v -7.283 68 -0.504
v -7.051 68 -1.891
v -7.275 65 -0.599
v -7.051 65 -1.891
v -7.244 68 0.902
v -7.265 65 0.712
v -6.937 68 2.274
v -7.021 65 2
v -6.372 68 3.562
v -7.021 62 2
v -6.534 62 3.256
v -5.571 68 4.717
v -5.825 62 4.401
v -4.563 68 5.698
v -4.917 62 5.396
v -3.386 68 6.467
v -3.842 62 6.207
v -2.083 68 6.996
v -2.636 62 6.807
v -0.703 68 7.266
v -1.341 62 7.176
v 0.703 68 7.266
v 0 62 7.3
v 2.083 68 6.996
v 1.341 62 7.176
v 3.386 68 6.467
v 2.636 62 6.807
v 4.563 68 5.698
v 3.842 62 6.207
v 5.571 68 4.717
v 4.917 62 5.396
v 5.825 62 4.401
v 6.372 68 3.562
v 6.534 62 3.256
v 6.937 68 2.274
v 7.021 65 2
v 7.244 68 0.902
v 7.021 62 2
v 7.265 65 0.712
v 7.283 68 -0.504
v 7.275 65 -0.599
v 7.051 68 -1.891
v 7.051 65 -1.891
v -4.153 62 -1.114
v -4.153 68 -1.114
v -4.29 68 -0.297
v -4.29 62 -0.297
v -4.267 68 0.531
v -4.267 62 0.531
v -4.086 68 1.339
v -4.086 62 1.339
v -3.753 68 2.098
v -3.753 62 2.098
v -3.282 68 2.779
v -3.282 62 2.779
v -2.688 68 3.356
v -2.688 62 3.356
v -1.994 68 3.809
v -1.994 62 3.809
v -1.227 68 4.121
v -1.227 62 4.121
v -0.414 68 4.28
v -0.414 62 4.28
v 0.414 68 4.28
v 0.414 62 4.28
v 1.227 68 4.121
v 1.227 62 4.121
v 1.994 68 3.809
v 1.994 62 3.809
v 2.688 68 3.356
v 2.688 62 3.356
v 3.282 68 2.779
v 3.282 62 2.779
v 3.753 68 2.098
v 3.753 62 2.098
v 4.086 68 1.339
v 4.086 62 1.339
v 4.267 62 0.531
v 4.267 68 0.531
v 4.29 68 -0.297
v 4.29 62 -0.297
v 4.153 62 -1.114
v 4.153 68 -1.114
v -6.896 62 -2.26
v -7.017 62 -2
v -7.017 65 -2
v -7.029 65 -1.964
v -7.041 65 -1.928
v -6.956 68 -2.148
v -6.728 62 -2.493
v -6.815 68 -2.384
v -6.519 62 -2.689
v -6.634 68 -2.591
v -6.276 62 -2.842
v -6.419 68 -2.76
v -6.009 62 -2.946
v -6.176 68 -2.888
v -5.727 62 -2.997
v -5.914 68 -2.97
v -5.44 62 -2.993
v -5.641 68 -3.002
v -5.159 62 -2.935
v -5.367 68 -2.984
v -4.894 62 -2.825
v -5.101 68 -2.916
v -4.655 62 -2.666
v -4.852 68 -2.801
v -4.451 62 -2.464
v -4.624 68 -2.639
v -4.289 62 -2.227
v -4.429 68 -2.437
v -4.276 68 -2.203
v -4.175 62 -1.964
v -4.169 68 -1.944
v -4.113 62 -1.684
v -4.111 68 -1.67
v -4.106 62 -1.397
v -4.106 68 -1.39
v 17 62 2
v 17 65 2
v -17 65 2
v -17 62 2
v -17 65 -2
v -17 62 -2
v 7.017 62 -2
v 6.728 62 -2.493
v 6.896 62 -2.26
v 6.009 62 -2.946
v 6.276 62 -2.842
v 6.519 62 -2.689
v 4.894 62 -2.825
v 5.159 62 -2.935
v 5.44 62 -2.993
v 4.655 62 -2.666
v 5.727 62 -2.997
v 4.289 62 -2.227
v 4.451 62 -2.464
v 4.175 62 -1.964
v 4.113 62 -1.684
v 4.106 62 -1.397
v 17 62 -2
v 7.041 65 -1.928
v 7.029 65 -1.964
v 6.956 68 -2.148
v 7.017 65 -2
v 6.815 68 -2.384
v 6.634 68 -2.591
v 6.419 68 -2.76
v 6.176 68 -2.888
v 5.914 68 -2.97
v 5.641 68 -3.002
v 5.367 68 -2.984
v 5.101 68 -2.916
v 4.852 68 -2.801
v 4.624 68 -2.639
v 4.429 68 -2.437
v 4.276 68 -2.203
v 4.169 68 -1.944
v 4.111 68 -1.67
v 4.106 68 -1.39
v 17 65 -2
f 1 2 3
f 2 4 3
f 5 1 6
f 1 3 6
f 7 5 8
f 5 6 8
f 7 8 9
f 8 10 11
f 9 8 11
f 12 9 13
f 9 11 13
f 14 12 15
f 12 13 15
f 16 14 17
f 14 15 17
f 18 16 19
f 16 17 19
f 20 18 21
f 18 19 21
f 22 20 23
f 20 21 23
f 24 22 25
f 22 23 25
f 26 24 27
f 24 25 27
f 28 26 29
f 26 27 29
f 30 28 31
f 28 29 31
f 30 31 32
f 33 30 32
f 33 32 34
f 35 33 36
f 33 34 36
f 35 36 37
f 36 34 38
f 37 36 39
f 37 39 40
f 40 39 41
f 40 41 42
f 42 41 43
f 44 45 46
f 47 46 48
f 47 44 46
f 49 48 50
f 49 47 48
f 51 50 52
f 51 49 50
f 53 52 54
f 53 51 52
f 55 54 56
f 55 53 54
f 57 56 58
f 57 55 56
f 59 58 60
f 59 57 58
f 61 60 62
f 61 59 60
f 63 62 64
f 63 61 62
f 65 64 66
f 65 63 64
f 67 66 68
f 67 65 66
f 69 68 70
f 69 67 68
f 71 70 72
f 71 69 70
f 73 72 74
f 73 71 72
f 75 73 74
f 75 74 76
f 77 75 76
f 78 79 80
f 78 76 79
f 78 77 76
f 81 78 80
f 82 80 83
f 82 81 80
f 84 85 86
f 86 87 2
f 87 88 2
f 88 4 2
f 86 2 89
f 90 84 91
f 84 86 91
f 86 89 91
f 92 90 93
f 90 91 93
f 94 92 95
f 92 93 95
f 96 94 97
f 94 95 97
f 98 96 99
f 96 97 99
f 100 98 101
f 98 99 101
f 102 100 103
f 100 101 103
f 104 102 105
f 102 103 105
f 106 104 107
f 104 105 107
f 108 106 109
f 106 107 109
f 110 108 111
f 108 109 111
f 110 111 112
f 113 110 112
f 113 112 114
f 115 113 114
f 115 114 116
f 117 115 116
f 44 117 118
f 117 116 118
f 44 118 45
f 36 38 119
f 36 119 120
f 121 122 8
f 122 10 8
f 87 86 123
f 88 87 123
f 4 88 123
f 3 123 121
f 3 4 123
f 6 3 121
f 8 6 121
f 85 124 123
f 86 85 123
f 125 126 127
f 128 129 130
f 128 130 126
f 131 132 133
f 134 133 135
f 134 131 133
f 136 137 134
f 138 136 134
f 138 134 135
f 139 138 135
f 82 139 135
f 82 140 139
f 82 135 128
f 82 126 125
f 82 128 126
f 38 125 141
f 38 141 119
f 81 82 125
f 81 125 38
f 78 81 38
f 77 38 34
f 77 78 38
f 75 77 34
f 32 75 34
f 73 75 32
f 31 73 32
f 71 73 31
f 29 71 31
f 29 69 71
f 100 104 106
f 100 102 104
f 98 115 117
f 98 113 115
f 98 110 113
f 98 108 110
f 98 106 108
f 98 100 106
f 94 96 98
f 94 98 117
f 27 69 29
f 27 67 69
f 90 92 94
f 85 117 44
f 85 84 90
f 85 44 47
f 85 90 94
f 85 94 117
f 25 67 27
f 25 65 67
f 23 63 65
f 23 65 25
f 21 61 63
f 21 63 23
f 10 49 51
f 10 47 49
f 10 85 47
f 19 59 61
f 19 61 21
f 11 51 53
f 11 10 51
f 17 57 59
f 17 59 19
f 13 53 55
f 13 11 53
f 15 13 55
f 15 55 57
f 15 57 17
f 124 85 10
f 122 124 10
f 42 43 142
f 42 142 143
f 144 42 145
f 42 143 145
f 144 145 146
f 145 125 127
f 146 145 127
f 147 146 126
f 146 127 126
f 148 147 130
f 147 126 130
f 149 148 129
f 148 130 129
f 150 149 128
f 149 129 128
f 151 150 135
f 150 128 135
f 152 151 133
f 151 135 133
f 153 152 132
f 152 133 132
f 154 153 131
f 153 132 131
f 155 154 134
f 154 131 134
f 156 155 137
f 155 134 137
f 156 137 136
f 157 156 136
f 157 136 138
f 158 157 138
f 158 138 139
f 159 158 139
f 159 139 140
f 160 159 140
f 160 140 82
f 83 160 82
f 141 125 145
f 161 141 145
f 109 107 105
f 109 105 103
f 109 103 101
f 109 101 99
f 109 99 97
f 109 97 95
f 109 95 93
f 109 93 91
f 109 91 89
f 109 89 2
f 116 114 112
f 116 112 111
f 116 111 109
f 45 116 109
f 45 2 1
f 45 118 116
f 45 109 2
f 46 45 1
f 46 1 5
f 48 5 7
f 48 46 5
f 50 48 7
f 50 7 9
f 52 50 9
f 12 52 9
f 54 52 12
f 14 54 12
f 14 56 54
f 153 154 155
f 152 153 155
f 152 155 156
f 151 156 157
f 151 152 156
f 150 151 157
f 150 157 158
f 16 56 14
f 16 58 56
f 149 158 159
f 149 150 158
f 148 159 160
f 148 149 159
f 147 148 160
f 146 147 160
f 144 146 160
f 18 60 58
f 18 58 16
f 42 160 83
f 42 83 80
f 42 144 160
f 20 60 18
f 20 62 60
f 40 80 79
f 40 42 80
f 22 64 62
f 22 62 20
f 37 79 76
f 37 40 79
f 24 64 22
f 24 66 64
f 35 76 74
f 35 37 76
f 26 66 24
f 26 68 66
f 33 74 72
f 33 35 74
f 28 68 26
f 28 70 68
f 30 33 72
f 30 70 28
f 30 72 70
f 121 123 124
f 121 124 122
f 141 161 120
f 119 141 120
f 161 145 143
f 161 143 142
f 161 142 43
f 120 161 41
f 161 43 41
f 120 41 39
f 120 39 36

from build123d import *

# Parameters (mm, degrees)
SKETCH1_W                = 30
SKETCH1_H                = 30
BOSS_EXTRUDE1_DEPTH      = 5
SKETCH2_W                = 10
SKETCH2_H                = 10
BOSS_EXTRUDE2_DEPTH      = 50
SKETCH3_W                = 10
SKETCH3_H                = 3
SKETCH3_W_2              = 5
SKETCH3_H_2              = 7
SKETCH3_H_3              = 5
BOSS_EXTRUDE3_DEPTH      = 2
BOSS_EXTRUDE4_DEPTH      = 3
BOSS_EXTRUDE4_DEPTH_BACK = 5
SKETCH4_R                = 7.3
SKETCH4_R_2              = 4.3
CUT_EXTRUDE1_DEPTH       = 6
CUT_EXTRUDE1_DEPTH_BACK  = 5
SKETCH6_R                = 4.3
FILLET1_R                = 1.5
FILLET2_R                = 1.5
FILLET3_R                = 2
SKETCH7_W                = 39.438883959
SKETCH7_H                = 36.533940166
CUT_EXTRUDE2_DEPTH       = 80
SKETCH8_W                = 4
SKETCH8_H                = 3
BOSS_EXTRUDE5_DEPTH      = 2


with BuildPart() as part:
    # Sketch1 → Boss-Extrude1 (new body)
    with BuildSketch(Plane(origin=(0, 0, 0), x_dir=(1, 0, 0), z_dir=(0, 1, 0))):
        Rectangle(SKETCH1_W, SKETCH1_H)
    extrude(amount=BOSS_EXTRUDE1_DEPTH)

    # Sketch2 → Boss-Extrude2 (add)
    with BuildSketch(Plane(origin=(0, 5, 0), x_dir=(1, 0, 0), z_dir=(0, 1, 0))):
        Rectangle(SKETCH2_W, SKETCH2_H)
    extrude(amount=BOSS_EXTRUDE2_DEPTH)

    # Sketch3 → Boss-Extrude3 (add, symmetric)
    with BuildSketch(Plane.XY):
        with Locations((-5, 63.5)):
            Rectangle(SKETCH3_W, SKETCH3_H)
        with Locations((-12.5, 63.5)):
            Rectangle(SKETCH3_W_2, SKETCH3_H)
        with Locations((-12.5, 58.5)):
            Rectangle(SKETCH3_W_2, SKETCH3_H_2)
        with Locations((-12.5, 52.5)):
            Rectangle(SKETCH3_W_2, SKETCH3_H_3)
        with Locations((-7.5, 52.5)):
            Rectangle(SKETCH3_W_2, SKETCH3_H_3)
    boss_extrude3 = extrude(amount=BOSS_EXTRUDE3_DEPTH, both=True)

    # Mirror1: Boss-Extrude3 across plane
    add(boss_extrude3.mirror(Plane(origin=(0, 0, 0), x_dir=(0, 0, 1), z_dir=(1, 0, 0))))

    # Sketch4 → Boss-Extrude4 (add, two sides: drawn at the far end of the back side and taken through both)
    with BuildSketch(Plane(origin=(0, 65, 0), x_dir=(1, 0, 0), z_dir=(0, 1, 0)).offset(-BOSS_EXTRUDE4_DEPTH_BACK)):
        with Locations(Location((0, 0, 0), (0, 0, 270))):
            Circle(SKETCH4_R)
        with Locations(Location((0, 0, 0), (0, 0, 270))):
            Circle(SKETCH4_R_2, mode=Mode.SUBTRACT)
    extrude(amount=BOSS_EXTRUDE4_DEPTH + BOSS_EXTRUDE4_DEPTH_BACK)

    # Sketch6 → Cut-Extrude1 (cut, two sides: drawn at the far end of the back side and taken through both)
    with BuildSketch(Plane(origin=(0, 65, 0), x_dir=(1, 0, 0), z_dir=(0, 1, 0)).offset(-CUT_EXTRUDE1_DEPTH_BACK)):
        Circle(SKETCH6_R)
        with BuildLine():
            Line((-6.321985448, 3.65), (0, 0))
            Line((0, 0), (6.321985448, 3.65))
            ThreePointArc((6.321985448, 3.65), (0, 7.3), (-6.321985448, 3.65))
        make_face()
    extrude(amount=CUT_EXTRUDE1_DEPTH + CUT_EXTRUDE1_DEPTH_BACK, mode=Mode.SUBTRACT)

    # Fillet1
    # the kernel refuses this fillet: 1.5 mm, written as the material it takes off along each edge
    with BuildSketch(Plane(origin=(6.321985448, 55.239509531, -3.65), x_dir=(0.3827782883031586, 1.5487943038784236e-14, 0.923840236190059), z_dir=(0, 1, 0))) as fillet1_piece_1_section:
        with BuildLine():
            CenterArc((1.708559593, -1.487187387), FILLET1_R, 82.505882759, 104.988234482)
            Line((0.221372206, -1.682823981), (0, 0))
            ThreePointArc((0, 0), (0.952098094, 0.062354719), (1.904196188, 0))
        make_face()
    fillet1_piece_1 = extrude(amount=17.520980938, mode=Mode.PRIVATE)
    fillet1_piece_1 = split(fillet1_piece_1, bisect_by=Plane(origin=(7.049867501, 58.619754766, -2), z_dir=(0, 0, 1)), keep=Keep.TOP, mode=Mode.PRIVATE)
    fillet1_piece_1 = split(fillet1_piece_1, bisect_by=Plane(origin=(7.049867501, 62, -1.948339527), z_dir=(0, -1, 0)), keep=Keep.TOP, mode=Mode.PRIVATE)
    add(fillet1_piece_1, mode=Mode.SUBTRACT)
    with BuildSketch(Plane(origin=(6.321985448, 55.239509531, -3.65), x_dir=(0.3827782883031586, 1.5487943038784236e-14, 0.923840236190059), z_dir=(0, 1, 0))) as fillet1_piece_2_section:
        with BuildLine():
            CenterArc((1.708559593, -1.487187387), FILLET1_R, 82.505882759, 104.988234482)
            Line((0.221372206, -1.682823981), (0, 0))
            ThreePointArc((0, 0), (0.952098094, 0.062354719), (1.904196188, 0))
        make_face()
    fillet1_piece_2 = extrude(amount=17.520980938, mode=Mode.PRIVATE)
    fillet1_piece_2 = split(fillet1_piece_2, bisect_by=Plane(origin=(6.1871982, 58.619754766, -2), z_dir=(0, 0, -1)), keep=Keep.TOP, mode=Mode.PRIVATE)
    fillet1_piece_2 = split(fillet1_piece_2, bisect_by=Plane(origin=(6.1871982, 62, -3.070632647), z_dir=(0, -1, 0)), keep=Keep.TOP, mode=Mode.PRIVATE)
    add(fillet1_piece_2, mode=Mode.SUBTRACT)
    with BuildSketch(Plane(origin=(6.321985448, 55.239509531, -3.65), x_dir=(0.3827782883031586, 1.5487943038784236e-14, 0.923840236190059), z_dir=(0, 1, 0))) as fillet1_piece_3_section:
        with BuildLine():
            CenterArc((1.708559593, -1.487187387), FILLET1_R, 82.505882759, 104.988234482)
            Line((0.221372206, -1.682823981), (0, 0))
            ThreePointArc((0, 0), (0.952098094, 0.062354719), (1.904196188, 0))
        make_face()
    fillet1_piece_3 = extrude(amount=17.520980938, mode=Mode.PRIVATE)
    fillet1_piece_3 = split(fillet1_piece_3, bisect_by=Plane(origin=(6.1871982, 63.5, -2), z_dir=(0, 0, -1)), keep=Keep.TOP, mode=Mode.PRIVATE)
    fillet1_piece_3 = split(fillet1_piece_3, bisect_by=Plane(origin=(6.1871982, 65, -3.070632647), z_dir=(0, -1, 0)), keep=Keep.TOP, mode=Mode.PRIVATE)
    fillet1_piece_3 = split(fillet1_piece_3, bisect_by=Plane(origin=(6.1871982, 62, -3.070632647), z_dir=(0, 1, 0)), keep=Keep.TOP, mode=Mode.PRIVATE)
    add(fillet1_piece_3, mode=Mode.SUBTRACT)
    with BuildSketch(Plane(origin=(6.321985448, 55.239509531, -3.65), x_dir=(0.3827782883031586, 1.5487943038784236e-14, 0.923840236190059), z_dir=(0, 1, 0))) as fillet1_piece_4_section:
        with BuildLine():
            CenterArc((1.708559593, -1.487187387), FILLET1_R, 82.505882759, 104.988234482)
            Line((0.221372206, -1.682823981), (0, 0))
            ThreePointArc((0, 0), (0.952098094, 0.062354719), (1.904196188, 0))
        make_face()
    fillet1_piece_4 = extrude(amount=17.520980938, mode=Mode.PRIVATE)
    fillet1_piece_4 = split(fillet1_piece_4, bisect_by=Plane(origin=(7.049867501, 68.880245234, -2), z_dir=(0, 0, 1)), keep=Keep.TOP, mode=Mode.PRIVATE)
    fillet1_piece_4 = split(fillet1_piece_4, bisect_by=Plane(origin=(7.049867501, 65, -1.948339527), z_dir=(0, 1, 0)), keep=Keep.TOP, mode=Mode.PRIVATE)
    add(fillet1_piece_4, mode=Mode.SUBTRACT)
    with BuildSketch(Plane(origin=(6.321985448, 55.239509531, -3.65), x_dir=(0.3827782883031586, 1.5487943038784236e-14, 0.923840236190059), z_dir=(0, 1, 0))) as fillet1_piece_5_section:
        with BuildLine():
            CenterArc((1.708559593, -1.487187387), FILLET1_R, 82.505882759, 104.988234482)
            Line((0.221372206, -1.682823981), (0, 0))
            ThreePointArc((0, 0), (0.952098094, 0.062354719), (1.904196188, 0))
        make_face()
    fillet1_piece_5 = extrude(amount=17.520980938, mode=Mode.PRIVATE)
    fillet1_piece_5 = split(fillet1_piece_5, bisect_by=Plane(origin=(6.1871982, 68.880245234, -2), z_dir=(0, 0, -1)), keep=Keep.TOP, mode=Mode.PRIVATE)
    fillet1_piece_5 = split(fillet1_piece_5, bisect_by=Plane(origin=(6.1871982, 65, -3.070632647), z_dir=(0, 1, 0)), keep=Keep.TOP, mode=Mode.PRIVATE)
    add(fillet1_piece_5, mode=Mode.SUBTRACT)
    with BuildSketch(Plane(origin=(3.723909236, 56.743305172, -2.15), x_dir=(0.38277828830315935, 0, 0.9238402361900588), z_dir=(0, 1, 0))) as fillet1_piece_6:
        with BuildLine():
            CenterArc((1.317286404, 1.487187387), FILLET1_R, 187.494117241, 75.011765518)
            Line((-0.169900983, 1.291550792), (0, 0))
            ThreePointArc((0, 0), (0.560824905, 0.036729492), (1.121649809, 0))
        make_face()
    extrude(amount=14.513389656, mode=Mode.SUBTRACT)

    # Fillet2
    # the kernel refuses this fillet: 1.5 mm, written as the material it takes off along each edge
    with BuildSketch(Plane(origin=(-3.723909236, 71.256694828, -2.15), x_dir=(-0.38277828830315846, 0, 0.923840236190059), z_dir=(0, -1, 0))) as fillet2_piece_1:
        with BuildLine():
            CenterArc((1.317286404, 1.487187387), FILLET2_R, 187.494117241, 75.011765518)
            Line((-0.169900983, 1.291550792), (0, 0))
            ThreePointArc((0, 0), (0.560824905, 0.036729492), (1.121649809, 0))
        make_face()
    extrude(amount=14.513389656, mode=Mode.SUBTRACT)
    with BuildSketch(Plane(origin=(-6.321985448, 72.760490469, -3.65), x_dir=(0.8660254037844403, 0, 0.4999999999999975), z_dir=(0, -1, 0))) as fillet2_piece_2_section:
        with BuildLine():
            CenterArc((1.697322069, 1.5), FILLET2_R, 165.011765518, 104.988234482)
            ThreePointArc((0.248353638, 1.887931034), (0.062354719, 0.952098094), (0, 0))
            Line((0, 0), (1.697322069, 0))
        make_face()
    fillet2_piece_2 = extrude(amount=17.520980938, mode=Mode.PRIVATE)
    fillet2_piece_2 = split(fillet2_piece_2, bisect_by=Plane(origin=(-6.1871982, 68.880245234, -2), z_dir=(0, 0, -1)), keep=Keep.TOP, mode=Mode.PRIVATE)
    fillet2_piece_2 = split(fillet2_piece_2, bisect_by=Plane(origin=(-6.1871982, 65, -3.070632647), z_dir=(0, 1, 0)), keep=Keep.TOP, mode=Mode.PRIVATE)
    add(fillet2_piece_2, mode=Mode.SUBTRACT)
    with BuildSketch(Plane(origin=(-6.321985448, 72.760490469, -3.65), x_dir=(0.8660254037844403, 0, 0.4999999999999975), z_dir=(0, -1, 0))) as fillet2_piece_3_section:
        with BuildLine():
            CenterArc((1.697322069, 1.5), FILLET2_R, 165.011765518, 104.988234482)
            ThreePointArc((0.248353638, 1.887931034), (0.062354719, 0.952098094), (0, 0))
            Line((0, 0), (1.697322069, 0))
        make_face()
    fillet2_piece_3 = extrude(amount=17.520980938, mode=Mode.PRIVATE)
    fillet2_piece_3 = split(fillet2_piece_3, bisect_by=Plane(origin=(-7.049867501, 68.880245234, -2), z_dir=(0, 0, 1)), keep=Keep.TOP, mode=Mode.PRIVATE)
    fillet2_piece_3 = split(fillet2_piece_3, bisect_by=Plane(origin=(-7.049867501, 65, -1.948339527), z_dir=(0, 1, 0)), keep=Keep.TOP, mode=Mode.PRIVATE)
    add(fillet2_piece_3, mode=Mode.SUBTRACT)
    with BuildSketch(Plane(origin=(-6.321985448, 72.760490469, -3.65), x_dir=(0.8660254037844403, 0, 0.4999999999999975), z_dir=(0, -1, 0))) as fillet2_piece_4_section:
        with BuildLine():
            CenterArc((1.697322069, 1.5), FILLET2_R, 165.011765518, 104.988234482)
            ThreePointArc((0.248353638, 1.887931034), (0.062354719, 0.952098094), (0, 0))
            Line((0, 0), (1.697322069, 0))
        make_face()
    fillet2_piece_4 = extrude(amount=17.520980938, mode=Mode.PRIVATE)
    fillet2_piece_4 = split(fillet2_piece_4, bisect_by=Plane(origin=(-6.1871982, 62, -3.070632647), z_dir=(0, 1, 0)), keep=Keep.TOP, mode=Mode.PRIVATE)
    fillet2_piece_4 = split(fillet2_piece_4, bisect_by=Plane(origin=(-6.1871982, 63.5, -2), z_dir=(0, 0, -1)), keep=Keep.TOP, mode=Mode.PRIVATE)
    fillet2_piece_4 = split(fillet2_piece_4, bisect_by=Plane(origin=(-6.1871982, 65, -3.070632647), z_dir=(0, -1, 0)), keep=Keep.TOP, mode=Mode.PRIVATE)
    add(fillet2_piece_4, mode=Mode.SUBTRACT)
    with BuildSketch(Plane(origin=(-6.321985448, 72.760490469, -3.65), x_dir=(0.8660254037844403, 0, 0.4999999999999975), z_dir=(0, -1, 0))) as fillet2_piece_5_section:
        with BuildLine():
            CenterArc((1.697322069, 1.5), FILLET2_R, 165.011765518, 104.988234482)
            ThreePointArc((0.248353638, 1.887931034), (0.062354719, 0.952098094), (0, 0))
            Line((0, 0), (1.697322069, 0))
        make_face()
    fillet2_piece_5 = extrude(amount=17.520980938, mode=Mode.PRIVATE)
    fillet2_piece_5 = split(fillet2_piece_5, bisect_by=Plane(origin=(-6.1871982, 62, -3.070632647), z_dir=(0, -1, 0)), keep=Keep.TOP, mode=Mode.PRIVATE)
    fillet2_piece_5 = split(fillet2_piece_5, bisect_by=Plane(origin=(-6.1871982, 58.619754766, -2), z_dir=(0, 0, -1)), keep=Keep.TOP, mode=Mode.PRIVATE)
    add(fillet2_piece_5, mode=Mode.SUBTRACT)
    with BuildSketch(Plane(origin=(-6.321985448, 72.760490469, -3.65), x_dir=(0.8660254037844403, 0, 0.4999999999999975), z_dir=(0, -1, 0))) as fillet2_piece_6_section:
        with BuildLine():
            CenterArc((1.697322069, 1.5), FILLET2_R, 165.011765518, 104.988234482)
            ThreePointArc((0.248353638, 1.887931034), (0.062354719, 0.952098094), (0, 0))
            Line((0, 0), (1.697322069, 0))
        make_face()
    fillet2_piece_6 = extrude(amount=17.520980938, mode=Mode.PRIVATE)
    fillet2_piece_6 = split(fillet2_piece_6, bisect_by=Plane(origin=(-7.049867501, 62, -1.948339527), z_dir=(0, -1, 0)), keep=Keep.TOP, mode=Mode.PRIVATE)
    fillet2_piece_6 = split(fillet2_piece_6, bisect_by=Plane(origin=(-7.049867501, 58.619754766, -2), z_dir=(0, 0, 1)), keep=Keep.TOP, mode=Mode.PRIVATE)
    add(fillet2_piece_6, mode=Mode.SUBTRACT)

    # Fillet3
    fillet3_edges = [part.edges().sort_by_distance(p)[0] for p in [
        (0, 0, -15),
        (15, 0, 0),
        (0, 0, 15),
        (-15, 0, 0),
    ]]
    fillet(fillet3_edges, radius=FILLET3_R)

    # Sketch7 → Cut-Extrude2 (cut)
    with BuildSketch(Plane.XZ.offset(-62)):
        with Locations((1.010233487, -0.46607454)):
            Rectangle(SKETCH7_W, SKETCH7_H)
    extrude(amount=CUT_EXTRUDE2_DEPTH, mode=Mode.SUBTRACT)

    # Sketch8 → Boss-Extrude5 (add)
    with BuildSketch(Plane.ZY.offset(15)):
        with Locations((0, 63.5)):
            Rectangle(SKETCH8_W, SKETCH8_H)
    boss_extrude5 = extrude(amount=BOSS_EXTRUDE5_DEPTH)

    # Mirror3: Boss-Extrude5 across plane
    add(boss_extrude5.mirror(Plane(origin=(0, 0, 0), x_dir=(0, 0, 1), z_dir=(1, 0, 0))))


solid = part.part
